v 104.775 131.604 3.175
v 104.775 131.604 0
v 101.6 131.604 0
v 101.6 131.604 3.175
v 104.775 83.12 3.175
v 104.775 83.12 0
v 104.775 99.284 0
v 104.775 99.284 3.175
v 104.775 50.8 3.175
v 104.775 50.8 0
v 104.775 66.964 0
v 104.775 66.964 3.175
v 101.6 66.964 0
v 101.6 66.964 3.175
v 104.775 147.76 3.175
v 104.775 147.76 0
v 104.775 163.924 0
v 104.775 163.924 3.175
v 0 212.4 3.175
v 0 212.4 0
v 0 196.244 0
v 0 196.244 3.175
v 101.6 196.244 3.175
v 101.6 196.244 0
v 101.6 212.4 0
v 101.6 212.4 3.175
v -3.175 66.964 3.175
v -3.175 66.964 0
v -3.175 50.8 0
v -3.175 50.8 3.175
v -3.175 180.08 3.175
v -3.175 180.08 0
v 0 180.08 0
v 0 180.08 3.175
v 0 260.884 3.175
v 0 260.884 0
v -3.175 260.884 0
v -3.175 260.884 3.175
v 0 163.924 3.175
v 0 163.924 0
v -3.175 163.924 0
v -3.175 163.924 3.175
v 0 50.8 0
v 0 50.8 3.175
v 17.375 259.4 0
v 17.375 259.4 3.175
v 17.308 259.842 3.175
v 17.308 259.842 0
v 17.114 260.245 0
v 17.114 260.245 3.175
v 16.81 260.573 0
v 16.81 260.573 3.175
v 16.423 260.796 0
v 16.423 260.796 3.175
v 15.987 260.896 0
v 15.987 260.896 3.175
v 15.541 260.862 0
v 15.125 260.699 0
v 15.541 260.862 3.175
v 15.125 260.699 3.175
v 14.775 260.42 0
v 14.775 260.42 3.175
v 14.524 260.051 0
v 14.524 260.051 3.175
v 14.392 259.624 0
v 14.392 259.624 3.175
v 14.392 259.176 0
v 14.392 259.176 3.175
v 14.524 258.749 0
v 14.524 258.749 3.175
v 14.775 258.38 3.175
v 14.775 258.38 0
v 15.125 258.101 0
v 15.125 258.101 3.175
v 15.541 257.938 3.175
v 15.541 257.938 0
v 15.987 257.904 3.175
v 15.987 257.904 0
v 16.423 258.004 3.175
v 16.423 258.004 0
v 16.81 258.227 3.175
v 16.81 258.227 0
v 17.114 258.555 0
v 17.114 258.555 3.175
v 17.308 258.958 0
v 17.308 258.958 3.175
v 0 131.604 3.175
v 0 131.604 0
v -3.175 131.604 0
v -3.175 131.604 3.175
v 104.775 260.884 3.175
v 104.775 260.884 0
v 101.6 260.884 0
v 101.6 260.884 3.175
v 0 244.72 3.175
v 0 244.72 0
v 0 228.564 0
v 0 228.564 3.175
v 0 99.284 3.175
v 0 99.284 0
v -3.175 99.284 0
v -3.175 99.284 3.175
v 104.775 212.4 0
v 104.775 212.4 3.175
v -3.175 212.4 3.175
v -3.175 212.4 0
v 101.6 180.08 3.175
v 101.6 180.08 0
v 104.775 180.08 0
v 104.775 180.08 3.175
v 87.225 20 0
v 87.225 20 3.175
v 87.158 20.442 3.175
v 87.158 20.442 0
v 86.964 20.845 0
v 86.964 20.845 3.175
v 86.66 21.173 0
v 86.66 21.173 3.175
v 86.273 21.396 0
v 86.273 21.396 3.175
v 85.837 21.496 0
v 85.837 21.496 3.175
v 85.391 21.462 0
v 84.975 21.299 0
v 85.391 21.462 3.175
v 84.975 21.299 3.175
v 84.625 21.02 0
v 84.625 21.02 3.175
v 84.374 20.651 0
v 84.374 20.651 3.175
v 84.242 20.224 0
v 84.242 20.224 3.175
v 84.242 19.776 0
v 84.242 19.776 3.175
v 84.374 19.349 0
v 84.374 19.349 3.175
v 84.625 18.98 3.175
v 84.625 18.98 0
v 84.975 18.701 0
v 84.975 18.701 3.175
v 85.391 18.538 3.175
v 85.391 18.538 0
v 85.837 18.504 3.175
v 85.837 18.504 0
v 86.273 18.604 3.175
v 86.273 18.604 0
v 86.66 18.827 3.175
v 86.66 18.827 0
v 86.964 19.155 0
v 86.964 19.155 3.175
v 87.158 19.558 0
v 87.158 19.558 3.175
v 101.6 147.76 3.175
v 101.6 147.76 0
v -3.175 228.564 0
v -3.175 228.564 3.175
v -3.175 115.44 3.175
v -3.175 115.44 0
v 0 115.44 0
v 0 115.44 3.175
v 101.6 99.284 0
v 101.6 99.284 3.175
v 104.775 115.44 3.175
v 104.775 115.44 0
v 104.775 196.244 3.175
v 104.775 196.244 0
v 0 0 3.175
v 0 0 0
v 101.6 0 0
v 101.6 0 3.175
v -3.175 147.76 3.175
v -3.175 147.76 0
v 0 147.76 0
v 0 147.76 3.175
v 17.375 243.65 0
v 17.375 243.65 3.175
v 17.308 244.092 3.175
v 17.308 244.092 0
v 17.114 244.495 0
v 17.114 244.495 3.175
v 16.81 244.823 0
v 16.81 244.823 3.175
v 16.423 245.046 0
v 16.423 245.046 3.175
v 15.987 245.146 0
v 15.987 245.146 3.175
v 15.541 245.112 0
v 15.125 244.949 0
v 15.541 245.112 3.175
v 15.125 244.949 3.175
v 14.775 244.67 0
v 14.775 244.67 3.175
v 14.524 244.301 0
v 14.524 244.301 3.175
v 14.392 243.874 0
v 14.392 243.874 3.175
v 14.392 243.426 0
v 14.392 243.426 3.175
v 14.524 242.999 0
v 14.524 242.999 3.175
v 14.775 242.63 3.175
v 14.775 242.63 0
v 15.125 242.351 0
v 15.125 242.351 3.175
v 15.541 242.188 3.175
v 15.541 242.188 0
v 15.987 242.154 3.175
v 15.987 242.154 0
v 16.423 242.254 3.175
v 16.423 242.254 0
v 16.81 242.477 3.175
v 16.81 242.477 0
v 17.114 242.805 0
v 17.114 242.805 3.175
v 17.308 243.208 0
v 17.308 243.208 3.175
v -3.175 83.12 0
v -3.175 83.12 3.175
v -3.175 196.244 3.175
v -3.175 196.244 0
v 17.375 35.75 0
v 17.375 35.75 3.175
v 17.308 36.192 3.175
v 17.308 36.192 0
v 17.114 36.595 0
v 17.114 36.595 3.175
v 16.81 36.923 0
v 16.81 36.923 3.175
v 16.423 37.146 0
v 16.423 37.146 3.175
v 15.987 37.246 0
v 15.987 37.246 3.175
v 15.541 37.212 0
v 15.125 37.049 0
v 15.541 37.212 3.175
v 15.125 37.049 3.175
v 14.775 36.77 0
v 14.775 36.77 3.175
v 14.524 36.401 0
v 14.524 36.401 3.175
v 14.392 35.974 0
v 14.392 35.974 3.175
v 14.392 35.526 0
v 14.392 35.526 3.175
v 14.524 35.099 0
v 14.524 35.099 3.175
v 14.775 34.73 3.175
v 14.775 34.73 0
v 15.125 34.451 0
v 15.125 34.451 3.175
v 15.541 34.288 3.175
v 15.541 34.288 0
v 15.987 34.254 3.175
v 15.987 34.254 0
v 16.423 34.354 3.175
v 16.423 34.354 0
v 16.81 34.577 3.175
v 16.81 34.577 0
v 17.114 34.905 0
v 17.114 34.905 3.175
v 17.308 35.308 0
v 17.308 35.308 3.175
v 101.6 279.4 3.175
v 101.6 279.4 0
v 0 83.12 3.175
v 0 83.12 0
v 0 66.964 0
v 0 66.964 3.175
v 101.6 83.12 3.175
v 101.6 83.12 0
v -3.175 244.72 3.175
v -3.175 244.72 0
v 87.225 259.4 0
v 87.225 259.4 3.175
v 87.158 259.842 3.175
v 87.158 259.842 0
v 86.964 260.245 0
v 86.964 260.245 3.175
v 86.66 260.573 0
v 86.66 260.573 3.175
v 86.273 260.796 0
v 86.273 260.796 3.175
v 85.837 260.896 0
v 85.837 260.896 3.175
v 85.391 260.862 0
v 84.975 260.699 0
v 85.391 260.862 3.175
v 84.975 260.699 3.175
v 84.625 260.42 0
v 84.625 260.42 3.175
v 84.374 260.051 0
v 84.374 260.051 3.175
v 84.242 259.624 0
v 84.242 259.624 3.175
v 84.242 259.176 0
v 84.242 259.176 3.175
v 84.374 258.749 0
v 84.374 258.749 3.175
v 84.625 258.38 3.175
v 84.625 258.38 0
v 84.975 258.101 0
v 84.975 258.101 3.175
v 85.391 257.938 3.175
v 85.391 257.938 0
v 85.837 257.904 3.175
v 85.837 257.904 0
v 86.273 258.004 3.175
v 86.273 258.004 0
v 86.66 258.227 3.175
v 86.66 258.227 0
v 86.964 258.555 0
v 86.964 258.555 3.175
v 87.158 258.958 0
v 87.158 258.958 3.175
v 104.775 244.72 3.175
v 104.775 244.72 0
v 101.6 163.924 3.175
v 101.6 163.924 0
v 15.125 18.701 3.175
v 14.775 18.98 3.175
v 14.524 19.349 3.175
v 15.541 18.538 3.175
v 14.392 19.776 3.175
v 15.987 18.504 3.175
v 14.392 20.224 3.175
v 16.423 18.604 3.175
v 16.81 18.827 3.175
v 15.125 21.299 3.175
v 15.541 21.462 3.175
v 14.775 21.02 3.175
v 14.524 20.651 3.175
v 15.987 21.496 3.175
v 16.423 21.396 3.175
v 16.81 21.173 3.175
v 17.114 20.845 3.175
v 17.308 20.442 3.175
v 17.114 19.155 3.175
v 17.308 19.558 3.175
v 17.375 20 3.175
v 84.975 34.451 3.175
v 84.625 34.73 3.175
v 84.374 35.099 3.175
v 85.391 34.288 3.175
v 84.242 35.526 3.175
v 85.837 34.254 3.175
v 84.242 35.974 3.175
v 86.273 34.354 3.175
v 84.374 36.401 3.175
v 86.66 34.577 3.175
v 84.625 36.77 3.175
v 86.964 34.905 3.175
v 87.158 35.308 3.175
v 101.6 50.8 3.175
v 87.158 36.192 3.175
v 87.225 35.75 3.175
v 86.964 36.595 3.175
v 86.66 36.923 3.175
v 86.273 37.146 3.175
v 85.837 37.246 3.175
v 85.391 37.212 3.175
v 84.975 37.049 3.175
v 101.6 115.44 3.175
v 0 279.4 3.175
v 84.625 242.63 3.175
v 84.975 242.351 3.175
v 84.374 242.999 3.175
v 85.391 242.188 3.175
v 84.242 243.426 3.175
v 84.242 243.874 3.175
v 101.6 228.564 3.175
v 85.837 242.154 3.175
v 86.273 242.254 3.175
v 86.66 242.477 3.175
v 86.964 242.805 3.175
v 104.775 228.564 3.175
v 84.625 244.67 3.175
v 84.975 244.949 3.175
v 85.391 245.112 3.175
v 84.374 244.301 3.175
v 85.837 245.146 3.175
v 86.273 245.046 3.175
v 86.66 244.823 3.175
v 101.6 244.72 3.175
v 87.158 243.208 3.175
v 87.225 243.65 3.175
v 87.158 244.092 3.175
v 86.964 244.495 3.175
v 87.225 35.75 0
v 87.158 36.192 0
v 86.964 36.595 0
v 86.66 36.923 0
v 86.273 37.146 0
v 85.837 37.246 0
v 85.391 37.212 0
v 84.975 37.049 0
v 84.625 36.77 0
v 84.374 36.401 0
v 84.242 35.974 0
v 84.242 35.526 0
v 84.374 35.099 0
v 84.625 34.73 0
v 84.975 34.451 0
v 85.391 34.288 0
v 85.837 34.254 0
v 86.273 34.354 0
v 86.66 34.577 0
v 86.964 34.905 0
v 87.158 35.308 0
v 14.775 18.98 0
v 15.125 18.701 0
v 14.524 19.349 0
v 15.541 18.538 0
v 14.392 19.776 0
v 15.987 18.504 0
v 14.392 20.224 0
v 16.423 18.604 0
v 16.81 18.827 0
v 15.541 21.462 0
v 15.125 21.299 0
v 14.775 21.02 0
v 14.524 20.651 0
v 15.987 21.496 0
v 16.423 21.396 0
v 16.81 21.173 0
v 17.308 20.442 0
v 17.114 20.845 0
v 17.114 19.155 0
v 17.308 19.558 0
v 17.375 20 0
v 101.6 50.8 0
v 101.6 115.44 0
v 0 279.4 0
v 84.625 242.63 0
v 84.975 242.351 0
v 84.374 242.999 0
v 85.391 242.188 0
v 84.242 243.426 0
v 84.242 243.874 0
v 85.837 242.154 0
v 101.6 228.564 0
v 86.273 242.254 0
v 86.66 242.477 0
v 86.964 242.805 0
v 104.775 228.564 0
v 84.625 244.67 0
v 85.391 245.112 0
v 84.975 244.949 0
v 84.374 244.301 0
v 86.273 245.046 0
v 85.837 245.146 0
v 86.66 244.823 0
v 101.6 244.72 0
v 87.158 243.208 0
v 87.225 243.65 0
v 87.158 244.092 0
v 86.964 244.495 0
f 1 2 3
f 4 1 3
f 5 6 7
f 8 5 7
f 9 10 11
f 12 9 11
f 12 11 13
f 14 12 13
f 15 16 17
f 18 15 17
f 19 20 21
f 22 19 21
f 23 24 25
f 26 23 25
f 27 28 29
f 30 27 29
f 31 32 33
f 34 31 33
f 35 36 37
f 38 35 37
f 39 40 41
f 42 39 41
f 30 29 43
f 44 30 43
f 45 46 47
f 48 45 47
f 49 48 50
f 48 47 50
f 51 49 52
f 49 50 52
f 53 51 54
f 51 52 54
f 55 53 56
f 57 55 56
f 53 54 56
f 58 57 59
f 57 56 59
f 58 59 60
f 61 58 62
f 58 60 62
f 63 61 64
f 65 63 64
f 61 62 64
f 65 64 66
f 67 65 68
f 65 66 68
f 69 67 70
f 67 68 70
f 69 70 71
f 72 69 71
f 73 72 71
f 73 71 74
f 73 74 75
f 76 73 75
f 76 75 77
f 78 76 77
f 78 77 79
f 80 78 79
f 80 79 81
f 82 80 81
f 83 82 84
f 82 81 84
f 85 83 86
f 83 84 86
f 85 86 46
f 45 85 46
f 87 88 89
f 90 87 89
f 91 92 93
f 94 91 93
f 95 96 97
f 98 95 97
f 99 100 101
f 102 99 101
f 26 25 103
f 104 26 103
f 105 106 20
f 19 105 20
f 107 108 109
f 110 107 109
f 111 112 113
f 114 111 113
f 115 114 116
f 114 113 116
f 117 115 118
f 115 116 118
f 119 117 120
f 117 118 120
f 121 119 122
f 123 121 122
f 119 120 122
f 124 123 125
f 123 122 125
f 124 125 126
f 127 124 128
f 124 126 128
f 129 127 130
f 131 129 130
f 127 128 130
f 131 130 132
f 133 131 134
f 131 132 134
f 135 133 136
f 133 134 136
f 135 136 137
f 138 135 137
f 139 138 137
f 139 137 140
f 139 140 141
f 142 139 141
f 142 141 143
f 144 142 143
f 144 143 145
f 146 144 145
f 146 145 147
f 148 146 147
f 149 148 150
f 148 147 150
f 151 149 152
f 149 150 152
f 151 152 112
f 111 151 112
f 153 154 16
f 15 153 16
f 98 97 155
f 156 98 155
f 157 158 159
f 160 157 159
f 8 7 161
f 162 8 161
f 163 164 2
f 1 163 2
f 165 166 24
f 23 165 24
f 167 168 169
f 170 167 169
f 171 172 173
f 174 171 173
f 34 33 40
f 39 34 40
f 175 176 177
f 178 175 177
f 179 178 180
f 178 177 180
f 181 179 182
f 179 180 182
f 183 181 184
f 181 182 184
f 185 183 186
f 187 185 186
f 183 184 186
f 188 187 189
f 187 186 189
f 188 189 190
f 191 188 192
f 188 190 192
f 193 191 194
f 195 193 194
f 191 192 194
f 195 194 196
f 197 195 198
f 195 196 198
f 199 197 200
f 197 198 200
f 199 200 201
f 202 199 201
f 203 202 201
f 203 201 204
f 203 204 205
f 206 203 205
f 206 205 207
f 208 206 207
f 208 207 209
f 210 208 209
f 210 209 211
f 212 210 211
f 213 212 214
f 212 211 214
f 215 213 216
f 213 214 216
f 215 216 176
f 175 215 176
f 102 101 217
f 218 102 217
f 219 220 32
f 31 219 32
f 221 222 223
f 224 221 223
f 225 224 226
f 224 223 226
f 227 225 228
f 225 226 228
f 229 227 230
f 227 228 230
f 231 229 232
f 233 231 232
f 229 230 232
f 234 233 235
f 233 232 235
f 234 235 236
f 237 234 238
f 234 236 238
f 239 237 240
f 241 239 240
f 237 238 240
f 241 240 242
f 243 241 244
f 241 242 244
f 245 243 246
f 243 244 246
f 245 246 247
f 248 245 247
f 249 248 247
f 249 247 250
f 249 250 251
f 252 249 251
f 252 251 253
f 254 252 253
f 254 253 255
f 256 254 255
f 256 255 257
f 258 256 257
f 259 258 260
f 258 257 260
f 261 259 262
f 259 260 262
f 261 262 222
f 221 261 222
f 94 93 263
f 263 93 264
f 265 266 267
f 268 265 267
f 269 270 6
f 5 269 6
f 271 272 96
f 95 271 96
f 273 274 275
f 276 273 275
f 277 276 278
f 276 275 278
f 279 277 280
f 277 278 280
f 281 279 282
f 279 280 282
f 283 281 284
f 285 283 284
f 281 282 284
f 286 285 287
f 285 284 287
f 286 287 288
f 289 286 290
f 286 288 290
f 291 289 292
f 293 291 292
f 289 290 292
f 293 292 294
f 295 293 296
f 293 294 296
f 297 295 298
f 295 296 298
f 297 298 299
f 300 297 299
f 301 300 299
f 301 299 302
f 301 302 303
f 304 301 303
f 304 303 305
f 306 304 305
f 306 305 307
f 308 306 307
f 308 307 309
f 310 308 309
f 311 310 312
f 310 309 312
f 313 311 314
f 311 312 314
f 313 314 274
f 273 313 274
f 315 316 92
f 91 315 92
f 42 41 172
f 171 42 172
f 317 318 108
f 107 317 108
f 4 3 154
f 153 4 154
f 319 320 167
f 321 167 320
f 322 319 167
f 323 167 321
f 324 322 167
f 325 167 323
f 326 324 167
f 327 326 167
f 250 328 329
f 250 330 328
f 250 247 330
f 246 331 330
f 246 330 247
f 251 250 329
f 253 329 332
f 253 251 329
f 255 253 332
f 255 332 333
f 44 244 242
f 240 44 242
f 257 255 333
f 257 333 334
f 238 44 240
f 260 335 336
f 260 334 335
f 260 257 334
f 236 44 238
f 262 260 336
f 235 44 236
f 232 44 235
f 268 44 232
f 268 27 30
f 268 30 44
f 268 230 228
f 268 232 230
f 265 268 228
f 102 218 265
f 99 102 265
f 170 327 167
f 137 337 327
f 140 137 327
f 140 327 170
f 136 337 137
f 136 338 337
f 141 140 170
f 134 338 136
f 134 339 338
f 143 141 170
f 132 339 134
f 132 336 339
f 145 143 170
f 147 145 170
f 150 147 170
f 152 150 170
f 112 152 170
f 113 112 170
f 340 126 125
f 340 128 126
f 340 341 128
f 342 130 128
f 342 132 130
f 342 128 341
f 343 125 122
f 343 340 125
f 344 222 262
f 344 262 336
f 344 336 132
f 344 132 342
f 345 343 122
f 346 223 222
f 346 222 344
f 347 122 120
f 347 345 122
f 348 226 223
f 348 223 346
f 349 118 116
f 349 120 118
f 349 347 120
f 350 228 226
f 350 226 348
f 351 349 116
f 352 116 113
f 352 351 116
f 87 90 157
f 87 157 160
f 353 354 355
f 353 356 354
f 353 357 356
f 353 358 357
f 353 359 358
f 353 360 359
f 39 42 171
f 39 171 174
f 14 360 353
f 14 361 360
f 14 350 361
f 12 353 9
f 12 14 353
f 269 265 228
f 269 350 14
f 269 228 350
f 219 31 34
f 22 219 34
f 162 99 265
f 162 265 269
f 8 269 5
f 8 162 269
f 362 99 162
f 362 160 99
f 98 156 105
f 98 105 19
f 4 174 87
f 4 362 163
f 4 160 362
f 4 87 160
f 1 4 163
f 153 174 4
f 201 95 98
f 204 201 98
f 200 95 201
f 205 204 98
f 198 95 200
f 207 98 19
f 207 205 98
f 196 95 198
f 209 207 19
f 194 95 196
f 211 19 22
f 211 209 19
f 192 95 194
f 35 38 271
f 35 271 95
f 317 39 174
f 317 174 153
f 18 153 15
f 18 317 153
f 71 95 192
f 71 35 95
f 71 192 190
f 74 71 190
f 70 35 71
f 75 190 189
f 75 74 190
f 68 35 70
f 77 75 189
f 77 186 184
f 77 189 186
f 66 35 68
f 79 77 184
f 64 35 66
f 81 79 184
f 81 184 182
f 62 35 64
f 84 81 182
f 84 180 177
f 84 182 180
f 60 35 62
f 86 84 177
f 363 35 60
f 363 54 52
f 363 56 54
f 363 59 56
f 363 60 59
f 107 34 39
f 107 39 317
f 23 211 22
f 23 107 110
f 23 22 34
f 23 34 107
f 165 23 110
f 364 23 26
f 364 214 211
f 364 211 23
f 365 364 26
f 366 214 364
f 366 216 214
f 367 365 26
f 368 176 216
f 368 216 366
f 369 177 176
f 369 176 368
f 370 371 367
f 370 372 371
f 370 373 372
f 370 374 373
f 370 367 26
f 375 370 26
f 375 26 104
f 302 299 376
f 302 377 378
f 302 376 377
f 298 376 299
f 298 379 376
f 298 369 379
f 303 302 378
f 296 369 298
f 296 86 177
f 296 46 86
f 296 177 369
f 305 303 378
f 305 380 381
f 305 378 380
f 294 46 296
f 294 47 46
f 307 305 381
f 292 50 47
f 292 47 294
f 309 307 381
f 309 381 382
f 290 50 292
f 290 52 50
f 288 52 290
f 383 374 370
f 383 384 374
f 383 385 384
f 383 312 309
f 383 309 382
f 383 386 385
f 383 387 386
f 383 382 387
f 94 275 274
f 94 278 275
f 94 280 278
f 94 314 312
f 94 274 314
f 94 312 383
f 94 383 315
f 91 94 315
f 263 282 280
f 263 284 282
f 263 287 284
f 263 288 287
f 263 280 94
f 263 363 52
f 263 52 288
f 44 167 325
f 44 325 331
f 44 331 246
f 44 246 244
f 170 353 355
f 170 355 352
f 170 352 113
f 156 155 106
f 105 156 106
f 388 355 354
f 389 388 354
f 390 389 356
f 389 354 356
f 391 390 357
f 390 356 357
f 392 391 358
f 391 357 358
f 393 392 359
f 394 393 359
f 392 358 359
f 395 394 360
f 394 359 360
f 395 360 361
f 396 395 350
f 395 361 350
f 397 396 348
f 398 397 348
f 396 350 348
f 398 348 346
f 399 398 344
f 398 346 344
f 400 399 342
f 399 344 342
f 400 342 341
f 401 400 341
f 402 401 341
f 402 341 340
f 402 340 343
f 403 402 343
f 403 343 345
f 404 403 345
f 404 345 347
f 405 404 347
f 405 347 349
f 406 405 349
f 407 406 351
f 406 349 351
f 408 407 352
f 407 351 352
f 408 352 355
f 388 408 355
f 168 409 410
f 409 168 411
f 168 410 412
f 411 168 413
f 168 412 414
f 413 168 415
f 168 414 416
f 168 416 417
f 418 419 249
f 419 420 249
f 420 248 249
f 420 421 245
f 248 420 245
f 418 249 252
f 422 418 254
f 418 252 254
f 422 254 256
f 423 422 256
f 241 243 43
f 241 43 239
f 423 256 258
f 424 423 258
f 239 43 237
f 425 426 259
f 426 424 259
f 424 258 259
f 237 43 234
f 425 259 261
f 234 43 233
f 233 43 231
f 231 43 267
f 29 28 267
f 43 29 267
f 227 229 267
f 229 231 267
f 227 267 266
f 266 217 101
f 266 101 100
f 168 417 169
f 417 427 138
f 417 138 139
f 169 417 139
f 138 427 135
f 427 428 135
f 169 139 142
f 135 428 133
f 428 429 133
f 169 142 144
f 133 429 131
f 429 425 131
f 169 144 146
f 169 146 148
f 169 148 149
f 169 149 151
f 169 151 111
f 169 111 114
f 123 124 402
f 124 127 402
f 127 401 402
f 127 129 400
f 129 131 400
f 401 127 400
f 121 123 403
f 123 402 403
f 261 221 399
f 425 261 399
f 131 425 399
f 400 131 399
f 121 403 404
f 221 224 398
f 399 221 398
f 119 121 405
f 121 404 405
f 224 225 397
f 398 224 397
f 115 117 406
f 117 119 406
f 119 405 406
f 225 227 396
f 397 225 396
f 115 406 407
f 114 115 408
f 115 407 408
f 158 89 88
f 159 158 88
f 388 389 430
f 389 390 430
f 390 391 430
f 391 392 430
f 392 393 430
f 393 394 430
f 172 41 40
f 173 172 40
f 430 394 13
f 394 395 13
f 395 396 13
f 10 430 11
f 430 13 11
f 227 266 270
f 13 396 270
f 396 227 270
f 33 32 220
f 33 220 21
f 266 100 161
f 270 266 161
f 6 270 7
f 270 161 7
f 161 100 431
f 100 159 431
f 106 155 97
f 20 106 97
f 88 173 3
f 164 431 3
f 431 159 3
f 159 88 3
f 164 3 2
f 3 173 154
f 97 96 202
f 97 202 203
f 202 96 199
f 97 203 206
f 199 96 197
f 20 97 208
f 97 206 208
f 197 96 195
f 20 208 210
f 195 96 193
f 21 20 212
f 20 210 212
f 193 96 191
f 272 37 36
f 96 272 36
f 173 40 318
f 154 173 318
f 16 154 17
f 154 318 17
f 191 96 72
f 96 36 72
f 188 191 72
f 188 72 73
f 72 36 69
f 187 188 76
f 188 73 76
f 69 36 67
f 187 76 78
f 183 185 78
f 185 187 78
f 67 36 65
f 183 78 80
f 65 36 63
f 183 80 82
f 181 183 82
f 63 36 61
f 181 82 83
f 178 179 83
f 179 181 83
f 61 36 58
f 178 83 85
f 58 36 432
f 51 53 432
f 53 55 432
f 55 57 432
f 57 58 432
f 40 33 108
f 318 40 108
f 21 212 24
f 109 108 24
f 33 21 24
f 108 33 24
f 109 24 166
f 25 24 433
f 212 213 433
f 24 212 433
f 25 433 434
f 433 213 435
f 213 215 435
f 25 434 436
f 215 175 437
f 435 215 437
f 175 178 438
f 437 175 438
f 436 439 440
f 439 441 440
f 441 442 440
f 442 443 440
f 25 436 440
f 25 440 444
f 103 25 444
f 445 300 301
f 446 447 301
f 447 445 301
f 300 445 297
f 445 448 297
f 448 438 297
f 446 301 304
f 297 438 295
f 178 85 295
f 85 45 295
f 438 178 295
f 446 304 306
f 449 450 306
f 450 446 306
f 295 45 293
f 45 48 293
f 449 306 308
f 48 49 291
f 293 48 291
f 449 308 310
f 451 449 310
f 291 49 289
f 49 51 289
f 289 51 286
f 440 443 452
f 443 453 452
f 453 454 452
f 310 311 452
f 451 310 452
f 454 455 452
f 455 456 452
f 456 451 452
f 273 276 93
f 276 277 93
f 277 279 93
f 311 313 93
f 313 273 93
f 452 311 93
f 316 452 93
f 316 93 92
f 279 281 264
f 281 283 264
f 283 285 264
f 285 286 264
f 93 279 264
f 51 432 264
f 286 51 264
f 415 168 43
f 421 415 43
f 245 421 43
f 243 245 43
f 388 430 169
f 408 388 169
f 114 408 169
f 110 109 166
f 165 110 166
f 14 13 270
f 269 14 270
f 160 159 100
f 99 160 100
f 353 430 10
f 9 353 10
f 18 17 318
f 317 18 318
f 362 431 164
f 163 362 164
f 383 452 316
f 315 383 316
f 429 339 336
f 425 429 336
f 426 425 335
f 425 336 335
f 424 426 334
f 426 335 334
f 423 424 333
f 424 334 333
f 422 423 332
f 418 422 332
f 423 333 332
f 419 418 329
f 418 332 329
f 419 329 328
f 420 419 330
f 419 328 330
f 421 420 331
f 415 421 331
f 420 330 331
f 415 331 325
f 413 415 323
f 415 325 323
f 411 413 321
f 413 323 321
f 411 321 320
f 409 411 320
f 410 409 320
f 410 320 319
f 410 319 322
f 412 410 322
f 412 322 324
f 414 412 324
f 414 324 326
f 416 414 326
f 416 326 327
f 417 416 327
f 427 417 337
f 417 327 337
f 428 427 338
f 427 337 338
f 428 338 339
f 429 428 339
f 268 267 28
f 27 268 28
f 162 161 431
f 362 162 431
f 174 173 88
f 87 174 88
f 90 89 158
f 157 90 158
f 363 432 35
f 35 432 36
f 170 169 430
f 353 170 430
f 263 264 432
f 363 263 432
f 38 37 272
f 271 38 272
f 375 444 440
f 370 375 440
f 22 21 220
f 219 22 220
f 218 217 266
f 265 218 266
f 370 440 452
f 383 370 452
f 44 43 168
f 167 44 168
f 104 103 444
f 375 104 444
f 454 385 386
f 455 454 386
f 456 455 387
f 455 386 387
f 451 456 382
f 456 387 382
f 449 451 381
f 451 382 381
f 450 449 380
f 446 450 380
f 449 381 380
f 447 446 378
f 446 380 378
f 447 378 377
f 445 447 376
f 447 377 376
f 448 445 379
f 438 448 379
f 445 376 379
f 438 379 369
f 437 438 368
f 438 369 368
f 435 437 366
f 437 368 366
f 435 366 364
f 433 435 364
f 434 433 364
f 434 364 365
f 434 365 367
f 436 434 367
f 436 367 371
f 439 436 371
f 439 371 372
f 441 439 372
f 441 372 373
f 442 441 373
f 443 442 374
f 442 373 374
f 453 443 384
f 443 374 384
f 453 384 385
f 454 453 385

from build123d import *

# Parameters (mm, degrees)
BOSS_EXTRUDE1_DEPTH = 3.175
SKETCH2_R           = 1.5
CUT_EXTRUDE1_DEPTH  = 3.175


with BuildPart() as part:
    # Sketch1 → Boss-Extrude1 (new body)
    with BuildSketch(Plane.XY):
        Polygon((101.6, 279.4), (0, 279.4), (0, 260.883636364), (-3.175, 260.883636364), (-3.175, 244.72), (0, 244.72), (0, 228.563636364), (-3.175, 228.563636364), (-3.175, 212.4), (0, 212.4), (0, 196.243636364), (-3.175, 196.243636364), (-3.175, 180.08), (0, 180.08), (0, 163.923636364), (-3.175, 163.923636364), (-3.175, 147.76), (0, 147.76), (0, 131.603636364), (-3.175, 131.603636364), (-3.175, 115.44), (0, 115.44), (0, 99.283636364), (-3.175, 99.283636364), (-3.175, 83.12), (0, 83.12), (0, 66.963636364), (-3.175, 66.963636364), (-3.175, 50.8), (0, 50.8), (0, 34.64), (0, 0), (101.6, 0), (101.6, 34.64), (101.6, 50.8), (104.775, 50.8), (104.775, 66.963636364), (101.6, 66.963636364), (101.6, 83.12), (104.775, 83.12), (104.775, 99.283636364), (101.6, 99.283636364), (101.6, 115.44), (104.775, 115.44), (104.775, 131.603636364), (101.6, 131.603636364), (101.6, 147.76), (104.775, 147.76), (104.775, 163.923636364), (101.6, 163.923636364), (101.6, 180.08), (104.775, 180.08), (104.775, 196.243636364), (101.6, 196.243636364), (101.6, 212.4), (104.775, 212.4), (104.775, 228.563636364), (101.6, 228.563636364), (101.6, 244.72), (104.775, 244.72), (104.775, 260.883636364), (101.6, 260.883636364), align=None)
    extrude(amount=BOSS_EXTRUDE1_DEPTH)

    # Sketch2 → Cut-Extrude1 (cut)
    with BuildSketch(Plane.XY.offset(3.175)):
        with Locations((15.875, 20)):
            Circle(SKETCH2_R)
        with Locations((15.875, 35.75)):
            Circle(SKETCH2_R)
        with Locations((15.875, 243.65)):
            Circle(SKETCH2_R)
        with Locations((15.875, 259.4)):
            Circle(SKETCH2_R)
        with Locations((85.725, 259.4)):
            Circle(SKETCH2_R)
        with Locations((85.725, 243.65)):
            Circle(SKETCH2_R)
        with Locations((85.725, 35.75)):
            Circle(SKETCH2_R)
        with Locations((85.725, 20)):
            Circle(SKETCH2_R)
    extrude(amount=-CUT_EXTRUDE1_DEPTH, mode=Mode.SUBTRACT)


solid = part.part
